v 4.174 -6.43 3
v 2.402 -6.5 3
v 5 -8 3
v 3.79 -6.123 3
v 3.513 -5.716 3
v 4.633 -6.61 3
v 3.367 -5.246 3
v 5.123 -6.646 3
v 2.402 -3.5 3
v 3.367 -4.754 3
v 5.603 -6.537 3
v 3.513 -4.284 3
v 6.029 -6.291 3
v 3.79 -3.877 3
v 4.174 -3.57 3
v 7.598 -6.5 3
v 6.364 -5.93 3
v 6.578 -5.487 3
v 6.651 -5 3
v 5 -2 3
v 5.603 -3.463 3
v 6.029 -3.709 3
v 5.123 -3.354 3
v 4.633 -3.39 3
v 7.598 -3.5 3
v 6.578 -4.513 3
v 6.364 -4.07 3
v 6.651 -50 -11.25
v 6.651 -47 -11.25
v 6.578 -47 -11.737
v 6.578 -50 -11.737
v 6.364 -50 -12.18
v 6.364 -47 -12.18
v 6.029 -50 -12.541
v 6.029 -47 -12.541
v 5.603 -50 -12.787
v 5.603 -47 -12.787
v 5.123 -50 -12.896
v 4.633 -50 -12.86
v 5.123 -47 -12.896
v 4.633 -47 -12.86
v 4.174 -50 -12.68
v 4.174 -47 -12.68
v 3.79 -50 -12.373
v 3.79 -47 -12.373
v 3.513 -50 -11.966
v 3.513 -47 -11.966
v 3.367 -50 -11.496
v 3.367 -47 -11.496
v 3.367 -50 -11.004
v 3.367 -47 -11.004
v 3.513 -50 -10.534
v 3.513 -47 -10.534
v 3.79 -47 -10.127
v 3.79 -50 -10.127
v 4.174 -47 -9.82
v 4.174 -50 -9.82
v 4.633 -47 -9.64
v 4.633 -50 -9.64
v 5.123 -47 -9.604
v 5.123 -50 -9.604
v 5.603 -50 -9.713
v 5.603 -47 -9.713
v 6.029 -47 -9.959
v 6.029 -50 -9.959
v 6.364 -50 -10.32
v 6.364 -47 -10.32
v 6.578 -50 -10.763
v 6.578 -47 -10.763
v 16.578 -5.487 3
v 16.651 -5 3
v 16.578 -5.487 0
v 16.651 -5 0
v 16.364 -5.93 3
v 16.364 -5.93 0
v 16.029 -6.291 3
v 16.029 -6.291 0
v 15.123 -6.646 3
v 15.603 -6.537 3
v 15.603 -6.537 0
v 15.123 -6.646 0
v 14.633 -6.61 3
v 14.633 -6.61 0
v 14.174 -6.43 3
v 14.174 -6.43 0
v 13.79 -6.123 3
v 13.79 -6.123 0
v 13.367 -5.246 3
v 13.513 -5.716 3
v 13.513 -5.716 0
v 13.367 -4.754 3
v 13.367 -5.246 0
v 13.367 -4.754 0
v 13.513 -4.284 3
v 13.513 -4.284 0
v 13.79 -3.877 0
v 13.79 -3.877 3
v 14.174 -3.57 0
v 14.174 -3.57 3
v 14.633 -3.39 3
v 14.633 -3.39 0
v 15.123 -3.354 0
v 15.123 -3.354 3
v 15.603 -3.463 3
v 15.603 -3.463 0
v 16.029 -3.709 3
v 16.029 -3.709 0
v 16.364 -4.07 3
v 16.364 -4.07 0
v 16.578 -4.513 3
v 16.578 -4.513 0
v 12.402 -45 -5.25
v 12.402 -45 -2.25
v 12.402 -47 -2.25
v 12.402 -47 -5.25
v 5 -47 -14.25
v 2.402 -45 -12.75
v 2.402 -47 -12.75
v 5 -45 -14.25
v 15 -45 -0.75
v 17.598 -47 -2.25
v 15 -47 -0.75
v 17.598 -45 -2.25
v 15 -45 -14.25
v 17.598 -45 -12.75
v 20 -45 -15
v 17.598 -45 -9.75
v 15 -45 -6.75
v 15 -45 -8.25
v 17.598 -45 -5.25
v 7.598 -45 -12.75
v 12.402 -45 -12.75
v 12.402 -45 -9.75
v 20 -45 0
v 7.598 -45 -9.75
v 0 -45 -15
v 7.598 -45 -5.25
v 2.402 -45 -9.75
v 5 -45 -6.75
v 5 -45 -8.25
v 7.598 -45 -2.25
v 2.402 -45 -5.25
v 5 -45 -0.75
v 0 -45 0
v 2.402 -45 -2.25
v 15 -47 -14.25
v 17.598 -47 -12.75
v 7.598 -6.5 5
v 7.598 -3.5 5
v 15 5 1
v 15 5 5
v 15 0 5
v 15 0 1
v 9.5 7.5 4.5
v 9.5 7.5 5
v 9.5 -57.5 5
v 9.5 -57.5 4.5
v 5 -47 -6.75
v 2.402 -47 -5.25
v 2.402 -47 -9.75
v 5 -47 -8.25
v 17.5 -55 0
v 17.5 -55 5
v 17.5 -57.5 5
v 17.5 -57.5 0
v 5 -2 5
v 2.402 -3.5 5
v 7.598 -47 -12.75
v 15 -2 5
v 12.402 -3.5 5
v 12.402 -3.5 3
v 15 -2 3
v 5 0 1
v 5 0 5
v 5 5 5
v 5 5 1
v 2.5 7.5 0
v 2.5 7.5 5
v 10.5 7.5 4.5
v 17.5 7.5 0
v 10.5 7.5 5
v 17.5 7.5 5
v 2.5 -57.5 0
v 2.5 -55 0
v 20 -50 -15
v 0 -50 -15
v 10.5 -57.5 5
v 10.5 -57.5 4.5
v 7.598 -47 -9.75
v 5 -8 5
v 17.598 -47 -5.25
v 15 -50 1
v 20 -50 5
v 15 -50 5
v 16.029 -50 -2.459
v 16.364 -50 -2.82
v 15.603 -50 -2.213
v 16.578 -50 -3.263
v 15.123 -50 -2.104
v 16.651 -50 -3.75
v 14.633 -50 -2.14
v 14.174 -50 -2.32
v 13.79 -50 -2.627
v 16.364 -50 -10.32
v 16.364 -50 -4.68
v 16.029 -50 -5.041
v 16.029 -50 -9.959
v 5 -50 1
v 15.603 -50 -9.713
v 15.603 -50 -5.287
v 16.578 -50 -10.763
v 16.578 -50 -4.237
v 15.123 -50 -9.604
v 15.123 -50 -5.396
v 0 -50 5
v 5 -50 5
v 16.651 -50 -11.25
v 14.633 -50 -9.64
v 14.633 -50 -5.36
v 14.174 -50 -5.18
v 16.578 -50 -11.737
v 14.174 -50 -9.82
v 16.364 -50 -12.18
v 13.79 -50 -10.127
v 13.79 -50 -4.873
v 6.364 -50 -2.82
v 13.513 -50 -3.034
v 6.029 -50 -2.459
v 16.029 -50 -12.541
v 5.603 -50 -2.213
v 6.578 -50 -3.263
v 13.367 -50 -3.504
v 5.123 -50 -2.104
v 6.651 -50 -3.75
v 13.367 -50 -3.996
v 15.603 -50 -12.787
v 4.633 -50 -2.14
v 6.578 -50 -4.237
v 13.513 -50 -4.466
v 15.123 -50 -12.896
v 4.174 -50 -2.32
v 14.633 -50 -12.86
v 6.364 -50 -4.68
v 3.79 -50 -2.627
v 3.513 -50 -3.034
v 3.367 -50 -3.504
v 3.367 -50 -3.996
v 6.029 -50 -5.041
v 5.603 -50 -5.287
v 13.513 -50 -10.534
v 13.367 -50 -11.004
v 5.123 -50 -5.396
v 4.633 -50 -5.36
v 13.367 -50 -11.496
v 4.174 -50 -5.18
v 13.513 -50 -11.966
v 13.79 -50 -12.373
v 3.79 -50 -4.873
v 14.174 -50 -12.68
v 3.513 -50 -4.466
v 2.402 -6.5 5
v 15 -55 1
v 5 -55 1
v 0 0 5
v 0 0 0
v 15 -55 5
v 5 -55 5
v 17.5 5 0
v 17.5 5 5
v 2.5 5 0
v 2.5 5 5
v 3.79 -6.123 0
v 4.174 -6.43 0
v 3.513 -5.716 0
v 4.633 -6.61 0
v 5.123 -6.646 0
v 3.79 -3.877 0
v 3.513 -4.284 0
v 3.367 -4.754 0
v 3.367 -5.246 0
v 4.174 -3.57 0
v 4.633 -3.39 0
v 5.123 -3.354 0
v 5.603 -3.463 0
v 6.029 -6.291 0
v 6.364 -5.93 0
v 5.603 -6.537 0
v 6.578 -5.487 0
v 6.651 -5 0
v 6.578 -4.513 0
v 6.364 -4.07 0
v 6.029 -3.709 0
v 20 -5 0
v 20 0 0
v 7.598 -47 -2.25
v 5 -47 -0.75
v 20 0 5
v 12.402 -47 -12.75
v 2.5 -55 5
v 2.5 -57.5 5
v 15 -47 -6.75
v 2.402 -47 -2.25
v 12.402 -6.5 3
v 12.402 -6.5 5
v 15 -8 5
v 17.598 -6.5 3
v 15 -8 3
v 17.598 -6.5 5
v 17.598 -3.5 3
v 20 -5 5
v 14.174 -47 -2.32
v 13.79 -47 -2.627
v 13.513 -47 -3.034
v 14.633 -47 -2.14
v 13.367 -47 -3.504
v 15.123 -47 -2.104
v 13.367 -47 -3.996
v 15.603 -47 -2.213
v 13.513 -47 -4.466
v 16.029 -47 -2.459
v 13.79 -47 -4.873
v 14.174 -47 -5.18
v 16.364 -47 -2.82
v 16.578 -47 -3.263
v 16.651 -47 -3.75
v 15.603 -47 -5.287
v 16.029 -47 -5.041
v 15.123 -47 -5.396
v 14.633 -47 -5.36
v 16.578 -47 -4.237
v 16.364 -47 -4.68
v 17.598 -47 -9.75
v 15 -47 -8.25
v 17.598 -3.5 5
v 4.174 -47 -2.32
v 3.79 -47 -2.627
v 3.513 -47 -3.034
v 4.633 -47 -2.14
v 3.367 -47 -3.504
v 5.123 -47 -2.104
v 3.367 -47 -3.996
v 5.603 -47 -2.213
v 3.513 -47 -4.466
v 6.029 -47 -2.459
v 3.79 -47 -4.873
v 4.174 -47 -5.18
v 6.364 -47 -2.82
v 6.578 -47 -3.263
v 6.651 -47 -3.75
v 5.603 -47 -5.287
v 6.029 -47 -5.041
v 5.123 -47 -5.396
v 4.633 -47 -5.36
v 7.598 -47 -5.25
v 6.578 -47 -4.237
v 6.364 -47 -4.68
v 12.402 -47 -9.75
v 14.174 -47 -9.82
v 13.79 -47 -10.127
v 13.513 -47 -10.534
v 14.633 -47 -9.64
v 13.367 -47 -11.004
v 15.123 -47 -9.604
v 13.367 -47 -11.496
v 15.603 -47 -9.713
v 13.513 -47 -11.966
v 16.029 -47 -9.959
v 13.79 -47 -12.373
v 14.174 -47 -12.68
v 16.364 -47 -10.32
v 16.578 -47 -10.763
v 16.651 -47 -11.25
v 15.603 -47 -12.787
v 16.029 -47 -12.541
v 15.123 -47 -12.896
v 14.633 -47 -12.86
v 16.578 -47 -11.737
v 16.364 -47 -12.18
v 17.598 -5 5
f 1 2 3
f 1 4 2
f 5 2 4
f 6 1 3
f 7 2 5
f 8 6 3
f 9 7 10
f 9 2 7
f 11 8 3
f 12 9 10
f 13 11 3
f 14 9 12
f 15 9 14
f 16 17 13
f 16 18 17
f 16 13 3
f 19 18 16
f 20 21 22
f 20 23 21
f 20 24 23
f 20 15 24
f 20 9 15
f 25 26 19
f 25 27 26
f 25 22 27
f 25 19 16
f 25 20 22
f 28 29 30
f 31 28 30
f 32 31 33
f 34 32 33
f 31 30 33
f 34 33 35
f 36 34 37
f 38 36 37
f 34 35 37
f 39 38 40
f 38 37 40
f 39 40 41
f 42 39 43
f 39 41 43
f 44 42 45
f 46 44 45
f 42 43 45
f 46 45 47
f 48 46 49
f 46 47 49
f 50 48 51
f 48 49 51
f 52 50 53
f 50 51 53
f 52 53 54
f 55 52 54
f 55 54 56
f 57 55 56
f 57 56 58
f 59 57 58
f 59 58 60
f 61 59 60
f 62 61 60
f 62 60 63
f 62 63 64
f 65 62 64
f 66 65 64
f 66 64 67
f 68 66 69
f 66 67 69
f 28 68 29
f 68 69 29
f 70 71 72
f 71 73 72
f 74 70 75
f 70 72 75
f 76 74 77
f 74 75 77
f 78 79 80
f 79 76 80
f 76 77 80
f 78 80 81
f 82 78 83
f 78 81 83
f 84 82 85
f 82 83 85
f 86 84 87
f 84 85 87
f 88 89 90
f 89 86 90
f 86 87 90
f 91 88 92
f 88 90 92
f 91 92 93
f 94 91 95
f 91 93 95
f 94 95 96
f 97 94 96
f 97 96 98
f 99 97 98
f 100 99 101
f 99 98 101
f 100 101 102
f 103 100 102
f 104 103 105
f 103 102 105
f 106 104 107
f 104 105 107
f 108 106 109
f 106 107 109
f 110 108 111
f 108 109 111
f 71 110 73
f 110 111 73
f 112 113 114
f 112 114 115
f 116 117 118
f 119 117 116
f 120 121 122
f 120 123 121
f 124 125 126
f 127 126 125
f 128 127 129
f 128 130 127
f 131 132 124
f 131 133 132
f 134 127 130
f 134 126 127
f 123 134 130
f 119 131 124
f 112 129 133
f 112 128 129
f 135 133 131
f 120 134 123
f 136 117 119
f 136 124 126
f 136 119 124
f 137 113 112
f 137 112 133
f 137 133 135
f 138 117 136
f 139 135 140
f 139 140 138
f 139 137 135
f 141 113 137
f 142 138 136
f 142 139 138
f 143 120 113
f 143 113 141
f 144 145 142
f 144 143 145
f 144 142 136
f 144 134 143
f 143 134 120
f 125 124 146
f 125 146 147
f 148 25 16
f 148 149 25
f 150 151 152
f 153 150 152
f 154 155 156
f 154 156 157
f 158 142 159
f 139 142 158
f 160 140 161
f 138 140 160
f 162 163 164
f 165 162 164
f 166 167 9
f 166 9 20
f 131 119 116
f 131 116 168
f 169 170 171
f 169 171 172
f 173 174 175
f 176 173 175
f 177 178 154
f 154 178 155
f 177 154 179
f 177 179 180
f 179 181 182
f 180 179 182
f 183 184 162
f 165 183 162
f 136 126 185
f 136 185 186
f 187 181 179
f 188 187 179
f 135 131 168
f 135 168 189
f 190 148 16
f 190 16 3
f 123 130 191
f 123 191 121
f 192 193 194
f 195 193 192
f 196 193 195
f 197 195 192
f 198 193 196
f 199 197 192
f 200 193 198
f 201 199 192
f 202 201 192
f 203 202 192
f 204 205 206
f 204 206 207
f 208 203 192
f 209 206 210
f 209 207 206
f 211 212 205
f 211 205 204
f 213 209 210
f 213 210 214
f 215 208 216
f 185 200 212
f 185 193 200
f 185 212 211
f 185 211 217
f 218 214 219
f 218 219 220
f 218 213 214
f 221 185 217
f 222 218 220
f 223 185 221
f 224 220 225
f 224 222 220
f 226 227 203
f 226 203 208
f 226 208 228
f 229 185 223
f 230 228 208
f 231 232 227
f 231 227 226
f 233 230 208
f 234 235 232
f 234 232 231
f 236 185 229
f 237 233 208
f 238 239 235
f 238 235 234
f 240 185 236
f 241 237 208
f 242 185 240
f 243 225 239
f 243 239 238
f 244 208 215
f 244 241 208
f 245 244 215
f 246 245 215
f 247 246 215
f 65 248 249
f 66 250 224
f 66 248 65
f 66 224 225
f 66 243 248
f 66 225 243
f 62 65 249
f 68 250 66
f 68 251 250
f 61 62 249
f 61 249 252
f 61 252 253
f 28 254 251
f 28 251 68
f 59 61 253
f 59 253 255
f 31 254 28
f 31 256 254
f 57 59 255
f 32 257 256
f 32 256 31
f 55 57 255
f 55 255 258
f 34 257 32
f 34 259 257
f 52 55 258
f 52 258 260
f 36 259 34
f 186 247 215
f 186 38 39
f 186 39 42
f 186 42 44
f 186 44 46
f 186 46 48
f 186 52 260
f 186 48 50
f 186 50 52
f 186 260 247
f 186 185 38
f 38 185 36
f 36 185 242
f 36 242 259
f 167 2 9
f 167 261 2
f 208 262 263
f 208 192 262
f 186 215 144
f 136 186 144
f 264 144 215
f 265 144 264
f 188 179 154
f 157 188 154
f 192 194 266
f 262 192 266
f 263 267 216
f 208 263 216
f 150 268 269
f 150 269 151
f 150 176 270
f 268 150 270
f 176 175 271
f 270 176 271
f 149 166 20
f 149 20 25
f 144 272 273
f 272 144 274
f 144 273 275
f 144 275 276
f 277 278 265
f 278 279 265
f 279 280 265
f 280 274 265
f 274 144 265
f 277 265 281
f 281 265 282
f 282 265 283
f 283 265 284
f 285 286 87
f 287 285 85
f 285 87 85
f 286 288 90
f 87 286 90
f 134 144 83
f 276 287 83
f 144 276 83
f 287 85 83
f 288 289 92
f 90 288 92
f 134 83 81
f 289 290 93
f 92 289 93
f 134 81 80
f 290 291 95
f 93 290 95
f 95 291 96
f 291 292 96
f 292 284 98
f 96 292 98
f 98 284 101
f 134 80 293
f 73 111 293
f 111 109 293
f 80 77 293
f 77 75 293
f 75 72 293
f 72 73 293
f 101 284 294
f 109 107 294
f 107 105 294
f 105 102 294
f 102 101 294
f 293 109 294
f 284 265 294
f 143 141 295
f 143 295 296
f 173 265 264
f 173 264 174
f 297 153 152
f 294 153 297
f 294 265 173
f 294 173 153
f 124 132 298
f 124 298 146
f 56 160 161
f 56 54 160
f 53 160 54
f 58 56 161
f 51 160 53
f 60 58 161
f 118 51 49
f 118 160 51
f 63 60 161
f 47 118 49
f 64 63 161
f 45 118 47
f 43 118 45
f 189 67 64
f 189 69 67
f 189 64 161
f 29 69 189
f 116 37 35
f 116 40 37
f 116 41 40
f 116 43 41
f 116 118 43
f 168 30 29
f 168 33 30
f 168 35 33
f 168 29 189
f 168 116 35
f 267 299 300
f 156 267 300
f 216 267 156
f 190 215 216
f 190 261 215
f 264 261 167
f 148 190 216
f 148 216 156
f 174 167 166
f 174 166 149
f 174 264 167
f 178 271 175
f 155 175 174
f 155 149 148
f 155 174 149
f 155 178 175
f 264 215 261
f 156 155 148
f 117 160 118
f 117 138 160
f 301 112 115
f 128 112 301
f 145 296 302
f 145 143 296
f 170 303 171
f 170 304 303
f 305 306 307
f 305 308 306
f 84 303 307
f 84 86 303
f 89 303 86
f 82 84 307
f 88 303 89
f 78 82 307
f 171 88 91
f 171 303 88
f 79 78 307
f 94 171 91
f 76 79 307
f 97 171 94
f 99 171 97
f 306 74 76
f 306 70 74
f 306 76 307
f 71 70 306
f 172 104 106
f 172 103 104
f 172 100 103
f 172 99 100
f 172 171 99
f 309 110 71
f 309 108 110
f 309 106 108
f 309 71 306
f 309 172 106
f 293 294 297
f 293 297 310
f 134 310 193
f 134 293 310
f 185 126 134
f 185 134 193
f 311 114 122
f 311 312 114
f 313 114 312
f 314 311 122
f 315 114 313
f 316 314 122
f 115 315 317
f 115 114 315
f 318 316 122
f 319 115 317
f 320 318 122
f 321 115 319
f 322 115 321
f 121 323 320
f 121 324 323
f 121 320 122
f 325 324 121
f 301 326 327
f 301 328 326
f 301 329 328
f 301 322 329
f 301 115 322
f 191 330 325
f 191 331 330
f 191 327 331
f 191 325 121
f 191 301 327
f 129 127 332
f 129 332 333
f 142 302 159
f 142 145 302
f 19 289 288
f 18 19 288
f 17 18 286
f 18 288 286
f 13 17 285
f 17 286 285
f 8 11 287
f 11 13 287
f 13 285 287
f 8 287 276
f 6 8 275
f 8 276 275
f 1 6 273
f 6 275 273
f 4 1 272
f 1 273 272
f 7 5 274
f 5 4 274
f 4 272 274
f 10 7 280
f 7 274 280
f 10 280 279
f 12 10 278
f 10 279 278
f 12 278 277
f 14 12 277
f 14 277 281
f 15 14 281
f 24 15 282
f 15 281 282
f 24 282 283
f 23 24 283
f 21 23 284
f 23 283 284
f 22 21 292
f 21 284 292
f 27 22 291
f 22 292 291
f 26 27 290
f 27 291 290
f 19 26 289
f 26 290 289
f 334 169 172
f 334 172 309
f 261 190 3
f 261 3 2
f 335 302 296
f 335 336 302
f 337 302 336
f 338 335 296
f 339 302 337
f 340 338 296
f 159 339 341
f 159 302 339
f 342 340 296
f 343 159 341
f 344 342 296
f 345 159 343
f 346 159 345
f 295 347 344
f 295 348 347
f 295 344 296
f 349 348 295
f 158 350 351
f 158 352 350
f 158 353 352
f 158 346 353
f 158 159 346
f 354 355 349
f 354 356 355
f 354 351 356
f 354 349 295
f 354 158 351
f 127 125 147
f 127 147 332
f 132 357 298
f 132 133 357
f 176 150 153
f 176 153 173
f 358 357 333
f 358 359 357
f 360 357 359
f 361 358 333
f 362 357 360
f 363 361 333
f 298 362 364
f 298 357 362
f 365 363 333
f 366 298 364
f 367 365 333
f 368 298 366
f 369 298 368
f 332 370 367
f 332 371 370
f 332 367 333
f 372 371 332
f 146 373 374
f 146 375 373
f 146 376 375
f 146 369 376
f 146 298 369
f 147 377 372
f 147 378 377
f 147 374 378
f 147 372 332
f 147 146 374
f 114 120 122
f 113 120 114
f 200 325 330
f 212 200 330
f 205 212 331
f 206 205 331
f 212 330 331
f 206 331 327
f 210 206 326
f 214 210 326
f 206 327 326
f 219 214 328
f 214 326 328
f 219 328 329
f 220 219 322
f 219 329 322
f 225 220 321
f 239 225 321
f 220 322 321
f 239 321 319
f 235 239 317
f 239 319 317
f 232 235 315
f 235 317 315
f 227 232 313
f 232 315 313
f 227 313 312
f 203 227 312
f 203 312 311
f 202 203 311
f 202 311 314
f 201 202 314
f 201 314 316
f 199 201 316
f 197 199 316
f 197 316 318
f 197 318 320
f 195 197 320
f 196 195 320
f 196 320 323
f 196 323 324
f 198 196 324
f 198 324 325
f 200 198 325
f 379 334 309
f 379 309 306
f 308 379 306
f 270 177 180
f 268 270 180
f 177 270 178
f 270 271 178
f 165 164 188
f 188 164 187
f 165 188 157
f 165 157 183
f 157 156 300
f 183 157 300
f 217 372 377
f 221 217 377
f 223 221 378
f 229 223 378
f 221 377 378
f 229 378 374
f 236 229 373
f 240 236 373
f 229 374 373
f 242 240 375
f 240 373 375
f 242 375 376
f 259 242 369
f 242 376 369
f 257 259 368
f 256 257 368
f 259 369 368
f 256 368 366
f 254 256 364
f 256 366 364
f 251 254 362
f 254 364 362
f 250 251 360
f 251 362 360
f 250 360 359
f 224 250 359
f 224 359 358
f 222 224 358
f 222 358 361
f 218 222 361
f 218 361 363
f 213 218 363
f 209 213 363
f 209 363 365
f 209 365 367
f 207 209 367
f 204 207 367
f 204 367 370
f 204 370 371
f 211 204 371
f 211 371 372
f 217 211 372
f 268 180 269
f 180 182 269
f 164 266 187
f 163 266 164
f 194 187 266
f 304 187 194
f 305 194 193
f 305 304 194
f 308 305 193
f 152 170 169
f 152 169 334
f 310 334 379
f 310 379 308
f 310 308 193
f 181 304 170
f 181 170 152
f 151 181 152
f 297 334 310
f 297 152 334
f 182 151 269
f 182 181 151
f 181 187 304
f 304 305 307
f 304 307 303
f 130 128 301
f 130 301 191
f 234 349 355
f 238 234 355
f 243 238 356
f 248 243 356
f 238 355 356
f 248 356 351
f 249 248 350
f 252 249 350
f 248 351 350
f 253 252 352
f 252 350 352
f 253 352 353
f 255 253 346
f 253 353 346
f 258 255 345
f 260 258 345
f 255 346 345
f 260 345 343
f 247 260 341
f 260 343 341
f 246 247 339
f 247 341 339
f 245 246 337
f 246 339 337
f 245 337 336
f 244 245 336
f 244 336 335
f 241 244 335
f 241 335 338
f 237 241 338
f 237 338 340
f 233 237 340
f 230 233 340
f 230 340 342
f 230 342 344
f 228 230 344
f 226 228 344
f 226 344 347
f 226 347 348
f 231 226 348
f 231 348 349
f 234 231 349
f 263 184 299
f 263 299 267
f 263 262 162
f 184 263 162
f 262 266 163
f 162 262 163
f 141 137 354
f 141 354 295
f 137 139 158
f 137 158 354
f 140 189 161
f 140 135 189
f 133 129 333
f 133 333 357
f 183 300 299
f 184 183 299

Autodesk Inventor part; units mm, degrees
ref_plane "YZ Plane" through (0, 0, 0) normal (1, 0, 0) x (0, 1, 0)
ref_plane "XZ Plane" through (0, 0, 0) normal (0, 1, 0) x (-1, 0, 0)
ref_plane "XY Plane" through (0, 0, 0) normal (0, 0, 1) x (1, 0, 0)
sketch "Sketch1" plane through (0, 0, 0) normal (0, 0, 1) x (1, 0, 0)
  line L0 (0, 0) -> (20, 0)
  line L1 (20, 0) -> (20, -2.7984)
  line L2 (0, -2.7984) -> (0, 0)
  line L3 (0, 0) -> (20, 0)
  line L4 (20, 0) -> (20, -50)
  line L5 (20, -50) -> (0, -50)
  line L6 (0, -50) -> (0, 0)
  line L7 (0, 0) -> (5, 0)
  line L8 (0, -5) -> (0, 0)
  circle A0 centre (5, -5) radius 1.651
  line L9 (20, 0) -> (15, 0)
  line L10 (15, -5) -> (20, -5)
  line L11 (20, -5) -> (20, 0)
  circle A1 centre (15, -5) radius 1.651
  dimension "d1" = 20
  dimension "d2" = 50
  dimension "d6" = 5
  dimension "d7" = 5
  dimension "d9" = 3.302
extrude "Extrusion1" add sketch "Sketch1" along normal blind 5
sketch "Sketch2" plane through (0, 0, 5) normal (0, 0, 1) x (1, 0, 0)
  line L0 (20, 0) -> (0, 0) projected
  line L1 (10, 0) -> (5, 0)
  line L2 (5, 0) -> (5, 5)
  line L3 (5, 5) -> (10, 5)
  line L4 (10, 5) -> (10, 0)
  line L5 (10, 5) -> (2.5, 5)
  line L6 (2.5, 5) -> (2.5, 7.5)
  line L7 (2.5, 7.5) -> (10, 7.5)
  line L8 (10, 7.5) -> (10, 5)
  line L9 (2.5, 7.5) -> (17.5, 7.5)
  line L10 (17.5, 7.5) -> (17.5, 5)
  line L11 (17.5, 5) -> (2.5, 5)
  line L12 (2.5, 5) -> (2.5, 7.5)
  line L13 (10, 5) -> (15, 5)
  line L14 (15, 5) -> (15, 0)
  line L15 (15, 0) -> (10, 0)
  line L16 (10, 0) -> (10, 5)
  dimension "d12" = 5
  dimension "d13" = 5
  dimension "d14" = 7.5
  dimension "d15" = 2.5
  dimension "d16" = 15
  dimension "d17" = 2.5
  dimension "d18" = 5
  dimension "d19" = 5
extrude "Extrusion2" add sketch "Sketch2" against normal blind 5
sketch "Sketch3" plane through (0, 0, 0) normal (0, 0, -1) x (-1, 0, 0)
  line L0 (-5, 0) -> (-5, 5) projected
  line L1 (-5, 0) -> (-15, 0)
  line L2 (-15, 0) -> (-15, 5)
  line L3 (-15, 5) -> (-5, 5)
  line L4 (-5, 5) -> (-5, 0)
  point P0 (0, 0)
extrude "Extrusion3" cut sketch "Sketch3" against normal blind 1
sketch "Sketch4" plane through (0, 0, 0) normal (0, 0, -1) x (-1, 0, 0)
  line L0 (-5, 0) -> (0, 0) projected
  line L1 (-20, -50) -> (0, -50) projected
  line L2 (0, 0) -> (-20, 0)
  line L3 (-20, 0) -> (-20, -50)
  line L4 (-20, -50) -> (0, -50)
  line L5 (0, -50) -> (0, 0)
  line L6 (0, -50) -> (-5, -50)
  line L7 (-5, -50) -> (-5, -30)
  line L8 (-5, -30) -> (0, -30)
  line L9 (0, -30) -> (0, -50)
  line L10 (0, -50) -> (0, 0) projected
  line L11 (0, -50) -> (-5, -50)
  line L12 (-5, -50) -> (-5, -30)
  line L13 (-5, -30) -> (0, -30)
  line L14 (0, -30) -> (0, -50)
  line L15 (0, -50) -> (-20, -50)
  line L16 (-20, -50) -> (-20, -45)
  line L17 (-20, -45) -> (0, -45)
  line L18 (0, -45) -> (0, -50)
  dimension "d28" = 5
  dimension "d29" = 20
  dimension "d30" = 5
  dimension "d31" = 20
  dimension "d32" = 20
  dimension "d33" = 5
extrude "Extrusion4" add sketch "Sketch4" along normal blind 15 contours L17 L7 L1 L3 | L5 L1 L7 L17
sketch "Sketch5" plane through (0, 0, 5) normal (0, 0, 1) x (1, 0, 0)
  line L0 (20, -50) -> (20, 0) projected
  line L1 (20, 0) -> (0, 0)
  line L2 (0, 0) -> (0, -50)
  line L3 (0, -50) -> (20, -50)
  line L4 (20, -50) -> (20, 0)
  line L5 (10, -50) -> (15, -50)
  line L6 (15, -50) -> (15, -55)
  line L7 (15, -55) -> (10, -55)
  line L8 (10, -55) -> (10, -50)
  line L9 (15, -55) -> (5, -55)
  line L10 (5, -55) -> (5, -50)
  line L11 (5, -50) -> (15, -50)
  line L12 (15, -50) -> (15, -55)
  line L13 (10, -55) -> (17.5, -55)
  line L14 (17.5, -55) -> (17.5, -57.5)
  line L15 (17.5, -57.5) -> (10, -57.5)
  line L16 (10, -57.5) -> (10, -55)
  line L17 (17.5, -57.5) -> (2.5, -57.5)
  line L18 (2.5, -57.5) -> (2.5, -55)
  line L19 (2.5, -55) -> (17.5, -55)
  line L20 (17.5, -55) -> (17.5, -57.5)
  dimension "d36" = 5
  dimension "d37" = 5
  dimension "d38" = 10
  dimension "d39" = 5
  dimension "d40" = 7.5
  dimension "d41" = 2.5
  dimension "d42" = 15
  dimension "d43" = 2.5
extrude "Extrusion5" add sketch "Sketch5" against normal blind 5 contours L6 L7 L8 L3 | L8 L9 L10 L3 | L13 L14 L15 L16 L7 | L16 L17 L18 L19 L9
sketch "Sketch6" plane through (0, 0, 0) normal (0, 0, -1) x (-1, 0, 0)
  line L0 (-5, -55) -> (-5, -50) projected
  line L1 (-15, -50) -> (-5, -50) projected
  line L2 (-5, -55) -> (-15, -55)
  line L3 (-15, -55) -> (-15, -50)
  line L4 (-15, -50) -> (-5, -50)
  line L5 (-5, -50) -> (-5, -55)
  point P0 (0, 0)
extrude "Extrusion6" cut sketch "Sketch6" against normal blind 1
sketch "Sketch8" plane through (0, -45, 0) normal (0, 1, 0) x (1, 0, 0)
  line L0 (0, 15) -> (20, 15) projected
  line L1 (0, 15) -> (20, 15)
  line L2 (20, 15) -> (20, 0)
  line L3 (20, 0) -> (0, 0)
  line L4 (0, 0) -> (0, 15)
  line L5 (0, 0) -> (0, 15) projected
  line L6 (0, 7.5) -> (20, 7.5)
  line L7 (20, 0) -> (20, 15) projected
  line L8 (20, 0) -> (0, 15)
  line L9 (20, 15) -> (0, 0)
  line L10 (10, 7.5) -> (10, 15)
  line L11 (10, 7.5) -> (10, 0)
  line L12 (10, 7.5) -> (0, 0)
  line L13 (10, 7.5) -> (20, 0)
  line L14 (10, 7.5) -> (0, 15)
  line L15 (10, 7.5) -> (20, 15)
  circle A0 centre (5, 3.75) radius 1.651
  circle A1 centre (15, 3.75) radius 1.651
  circle A2 centre (15, 11.25) radius 1.651
  circle A3 centre (5, 11.25) radius 1.651
  dimension "d48" = 3.302
  dimension "d49" = 3.302
  dimension "d50" = 3.302
  dimension "d51" = 3.302
extrude "Extrusion7" cut sketch "Sketch8" against normal blind 5 contours A3 L8 | L8 A3 | A2 L9 | L9 A2 | A1 L8 | L8 A1 | A0 L9 | L9 A0
sketch "Sketch9" plane through (2.5, -57.5, 5) normal (0, -1, 0) x (1, 0, 0)
  line L0 (15, 0) -> (0, 0) projected
  line L1 (7.5, 0) -> (8, 0)
  line L2 (8, 0) -> (8, -0.5)
  line L3 (8, -0.5) -> (7.5, -0.5)
  line L4 (7.5, -0.5) -> (7.5, 0)
  line L5 (7.5, 0) -> (7, 0)
  line L6 (7, 0) -> (7, -0.5)
  line L7 (7, -0.5) -> (7.5, -0.5)
  line L8 (7.5, -0.5) -> (7.5, 0)
  point P0 (-2.5, -5)
  dimension "d54" = 0.5
  dimension "d55" = 0.5
  dimension "d56" = 0.5
  dimension "d57" = 0.5
extrude "Extrusion8" cut sketch "Sketch9" against normal blind 500
sketch "Sketch10" plane through (0, -45, 0) normal (0, 1, 0) x (1, 0, 0)
  circle A0 centre (5, 11.25) radius 1.651 projected
  circle A1 centre (5, 11.25) radius 1.651
  circle A2 centre (5, 3.75) radius 1.651 projected
  circle A3 centre (5, 3.75) radius 1.651
  circle A4 centre (15, 11.25) radius 1.651 projected
  circle A5 centre (15, 11.25) radius 1.651
  circle A6 centre (15, 3.75) radius 1.651 projected
  circle A7 centre (15, 3.75) radius 1.651
  circle A8 centre (5, 11.25) radius 3
  circle A9 centre (15, 11.25) radius 3
  circle A10 centre (5, 3.75) radius 3
  circle A11 centre (15, 3.75) radius 3
  line L0 (5, 14.25) -> (7.5981, 12.75)
  line L1 (7.5981, 12.75) -> (7.5981, 9.75)
  line L2 (7.5981, 9.75) -> (5, 8.25)
  line L3 (5, 8.25) -> (2.4019, 9.75)
  line L4 (2.4019, 9.75) -> (2.4019, 12.75)
  line L5 (2.4019, 12.75) -> (5, 14.25)
  line L6 (15, 14.25) -> (17.5981, 12.75)
  line L7 (17.5981, 12.75) -> (17.5981, 9.75)
  line L8 (17.5981, 9.75) -> (15, 8.25)
  line L9 (15, 8.25) -> (12.4019, 9.75)
  line L10 (12.4019, 9.75) -> (12.4019, 12.75)
  line L11 (12.4019, 12.75) -> (15, 14.25)
  line L12 (5, 6.75) -> (7.5981, 5.25)
  line L13 (7.5981, 5.25) -> (7.5981, 2.25)
  line L14 (7.5981, 2.25) -> (5, 0.75)
  line L15 (5, 0.75) -> (2.4019, 2.25)
  line L16 (2.4019, 2.25) -> (2.4019, 5.25)
  line L17 (2.4019, 5.25) -> (5, 6.75)
  line L18 (15, 6.75) -> (17.5981, 5.25)
  line L19 (17.5981, 5.25) -> (17.5981, 2.25)
  line L20 (17.5981, 2.25) -> (15, 0.75)
  line L21 (15, 0.75) -> (12.4019, 2.25)
  line L22 (12.4019, 2.25) -> (12.4019, 5.25)
  line L23 (12.4019, 5.25) -> (15, 6.75)
  point P0 (0, 0)
  dimension "d60" = 6
  dimension "d61" = 6
  dimension "d62" = 6
  dimension "d63" = 6
extrude "Extrusion9" cut sketch "Sketch10" against normal blind 2 contours L1 L2 L3 L4 L5 L0 | L7 L8 L9 L10 L11 L6 | L13 L14 L15 L16 L17 L12 | L19 L20 L21 L22 L23 L18
sketch "Sketch11" plane through (0, 0, 5) normal (0, 0, 1) x (1, 0, 0)
  circle A0 centre (5, -5) radius 1.651 projected
  circle A1 centre (5, -5) radius 3
  circle A2 centre (15, -5) radius 1.651 projected
  circle A3 centre (15, -5) radius 3
  line L0 (5, -2) -> (7.5981, -3.5)
  line L1 (7.5981, -3.5) -> (7.5981, -6.5)
  line L2 (7.5981, -6.5) -> (5, -8)
  line L3 (5, -8) -> (2.4019, -6.5)
  line L4 (2.4019, -6.5) -> (2.4019, -3.5)
  line L5 (2.4019, -3.5) -> (5, -2)
  line L6 (15, -2) -> (17.5981, -3.5)
  line L7 (17.5981, -3.5) -> (17.5981, -6.5)
  line L8 (17.5981, -6.5) -> (15, -8)
  line L9 (15, -8) -> (12.4019, -6.5)
  line L10 (12.4019, -6.5) -> (12.4019, -3.5)
  line L11 (12.4019, -3.5) -> (15, -2)
  point P0 (0, 0)
  dimension "d66" = 6
  dimension "d67" = 6
extrude "Extrusion10" cut sketch "Sketch11" against normal blind 2 contours L1 L2 L3 L4 L5 L0 | L7 L8 L9 L10 L11 L6
properties part number "Attachment"
